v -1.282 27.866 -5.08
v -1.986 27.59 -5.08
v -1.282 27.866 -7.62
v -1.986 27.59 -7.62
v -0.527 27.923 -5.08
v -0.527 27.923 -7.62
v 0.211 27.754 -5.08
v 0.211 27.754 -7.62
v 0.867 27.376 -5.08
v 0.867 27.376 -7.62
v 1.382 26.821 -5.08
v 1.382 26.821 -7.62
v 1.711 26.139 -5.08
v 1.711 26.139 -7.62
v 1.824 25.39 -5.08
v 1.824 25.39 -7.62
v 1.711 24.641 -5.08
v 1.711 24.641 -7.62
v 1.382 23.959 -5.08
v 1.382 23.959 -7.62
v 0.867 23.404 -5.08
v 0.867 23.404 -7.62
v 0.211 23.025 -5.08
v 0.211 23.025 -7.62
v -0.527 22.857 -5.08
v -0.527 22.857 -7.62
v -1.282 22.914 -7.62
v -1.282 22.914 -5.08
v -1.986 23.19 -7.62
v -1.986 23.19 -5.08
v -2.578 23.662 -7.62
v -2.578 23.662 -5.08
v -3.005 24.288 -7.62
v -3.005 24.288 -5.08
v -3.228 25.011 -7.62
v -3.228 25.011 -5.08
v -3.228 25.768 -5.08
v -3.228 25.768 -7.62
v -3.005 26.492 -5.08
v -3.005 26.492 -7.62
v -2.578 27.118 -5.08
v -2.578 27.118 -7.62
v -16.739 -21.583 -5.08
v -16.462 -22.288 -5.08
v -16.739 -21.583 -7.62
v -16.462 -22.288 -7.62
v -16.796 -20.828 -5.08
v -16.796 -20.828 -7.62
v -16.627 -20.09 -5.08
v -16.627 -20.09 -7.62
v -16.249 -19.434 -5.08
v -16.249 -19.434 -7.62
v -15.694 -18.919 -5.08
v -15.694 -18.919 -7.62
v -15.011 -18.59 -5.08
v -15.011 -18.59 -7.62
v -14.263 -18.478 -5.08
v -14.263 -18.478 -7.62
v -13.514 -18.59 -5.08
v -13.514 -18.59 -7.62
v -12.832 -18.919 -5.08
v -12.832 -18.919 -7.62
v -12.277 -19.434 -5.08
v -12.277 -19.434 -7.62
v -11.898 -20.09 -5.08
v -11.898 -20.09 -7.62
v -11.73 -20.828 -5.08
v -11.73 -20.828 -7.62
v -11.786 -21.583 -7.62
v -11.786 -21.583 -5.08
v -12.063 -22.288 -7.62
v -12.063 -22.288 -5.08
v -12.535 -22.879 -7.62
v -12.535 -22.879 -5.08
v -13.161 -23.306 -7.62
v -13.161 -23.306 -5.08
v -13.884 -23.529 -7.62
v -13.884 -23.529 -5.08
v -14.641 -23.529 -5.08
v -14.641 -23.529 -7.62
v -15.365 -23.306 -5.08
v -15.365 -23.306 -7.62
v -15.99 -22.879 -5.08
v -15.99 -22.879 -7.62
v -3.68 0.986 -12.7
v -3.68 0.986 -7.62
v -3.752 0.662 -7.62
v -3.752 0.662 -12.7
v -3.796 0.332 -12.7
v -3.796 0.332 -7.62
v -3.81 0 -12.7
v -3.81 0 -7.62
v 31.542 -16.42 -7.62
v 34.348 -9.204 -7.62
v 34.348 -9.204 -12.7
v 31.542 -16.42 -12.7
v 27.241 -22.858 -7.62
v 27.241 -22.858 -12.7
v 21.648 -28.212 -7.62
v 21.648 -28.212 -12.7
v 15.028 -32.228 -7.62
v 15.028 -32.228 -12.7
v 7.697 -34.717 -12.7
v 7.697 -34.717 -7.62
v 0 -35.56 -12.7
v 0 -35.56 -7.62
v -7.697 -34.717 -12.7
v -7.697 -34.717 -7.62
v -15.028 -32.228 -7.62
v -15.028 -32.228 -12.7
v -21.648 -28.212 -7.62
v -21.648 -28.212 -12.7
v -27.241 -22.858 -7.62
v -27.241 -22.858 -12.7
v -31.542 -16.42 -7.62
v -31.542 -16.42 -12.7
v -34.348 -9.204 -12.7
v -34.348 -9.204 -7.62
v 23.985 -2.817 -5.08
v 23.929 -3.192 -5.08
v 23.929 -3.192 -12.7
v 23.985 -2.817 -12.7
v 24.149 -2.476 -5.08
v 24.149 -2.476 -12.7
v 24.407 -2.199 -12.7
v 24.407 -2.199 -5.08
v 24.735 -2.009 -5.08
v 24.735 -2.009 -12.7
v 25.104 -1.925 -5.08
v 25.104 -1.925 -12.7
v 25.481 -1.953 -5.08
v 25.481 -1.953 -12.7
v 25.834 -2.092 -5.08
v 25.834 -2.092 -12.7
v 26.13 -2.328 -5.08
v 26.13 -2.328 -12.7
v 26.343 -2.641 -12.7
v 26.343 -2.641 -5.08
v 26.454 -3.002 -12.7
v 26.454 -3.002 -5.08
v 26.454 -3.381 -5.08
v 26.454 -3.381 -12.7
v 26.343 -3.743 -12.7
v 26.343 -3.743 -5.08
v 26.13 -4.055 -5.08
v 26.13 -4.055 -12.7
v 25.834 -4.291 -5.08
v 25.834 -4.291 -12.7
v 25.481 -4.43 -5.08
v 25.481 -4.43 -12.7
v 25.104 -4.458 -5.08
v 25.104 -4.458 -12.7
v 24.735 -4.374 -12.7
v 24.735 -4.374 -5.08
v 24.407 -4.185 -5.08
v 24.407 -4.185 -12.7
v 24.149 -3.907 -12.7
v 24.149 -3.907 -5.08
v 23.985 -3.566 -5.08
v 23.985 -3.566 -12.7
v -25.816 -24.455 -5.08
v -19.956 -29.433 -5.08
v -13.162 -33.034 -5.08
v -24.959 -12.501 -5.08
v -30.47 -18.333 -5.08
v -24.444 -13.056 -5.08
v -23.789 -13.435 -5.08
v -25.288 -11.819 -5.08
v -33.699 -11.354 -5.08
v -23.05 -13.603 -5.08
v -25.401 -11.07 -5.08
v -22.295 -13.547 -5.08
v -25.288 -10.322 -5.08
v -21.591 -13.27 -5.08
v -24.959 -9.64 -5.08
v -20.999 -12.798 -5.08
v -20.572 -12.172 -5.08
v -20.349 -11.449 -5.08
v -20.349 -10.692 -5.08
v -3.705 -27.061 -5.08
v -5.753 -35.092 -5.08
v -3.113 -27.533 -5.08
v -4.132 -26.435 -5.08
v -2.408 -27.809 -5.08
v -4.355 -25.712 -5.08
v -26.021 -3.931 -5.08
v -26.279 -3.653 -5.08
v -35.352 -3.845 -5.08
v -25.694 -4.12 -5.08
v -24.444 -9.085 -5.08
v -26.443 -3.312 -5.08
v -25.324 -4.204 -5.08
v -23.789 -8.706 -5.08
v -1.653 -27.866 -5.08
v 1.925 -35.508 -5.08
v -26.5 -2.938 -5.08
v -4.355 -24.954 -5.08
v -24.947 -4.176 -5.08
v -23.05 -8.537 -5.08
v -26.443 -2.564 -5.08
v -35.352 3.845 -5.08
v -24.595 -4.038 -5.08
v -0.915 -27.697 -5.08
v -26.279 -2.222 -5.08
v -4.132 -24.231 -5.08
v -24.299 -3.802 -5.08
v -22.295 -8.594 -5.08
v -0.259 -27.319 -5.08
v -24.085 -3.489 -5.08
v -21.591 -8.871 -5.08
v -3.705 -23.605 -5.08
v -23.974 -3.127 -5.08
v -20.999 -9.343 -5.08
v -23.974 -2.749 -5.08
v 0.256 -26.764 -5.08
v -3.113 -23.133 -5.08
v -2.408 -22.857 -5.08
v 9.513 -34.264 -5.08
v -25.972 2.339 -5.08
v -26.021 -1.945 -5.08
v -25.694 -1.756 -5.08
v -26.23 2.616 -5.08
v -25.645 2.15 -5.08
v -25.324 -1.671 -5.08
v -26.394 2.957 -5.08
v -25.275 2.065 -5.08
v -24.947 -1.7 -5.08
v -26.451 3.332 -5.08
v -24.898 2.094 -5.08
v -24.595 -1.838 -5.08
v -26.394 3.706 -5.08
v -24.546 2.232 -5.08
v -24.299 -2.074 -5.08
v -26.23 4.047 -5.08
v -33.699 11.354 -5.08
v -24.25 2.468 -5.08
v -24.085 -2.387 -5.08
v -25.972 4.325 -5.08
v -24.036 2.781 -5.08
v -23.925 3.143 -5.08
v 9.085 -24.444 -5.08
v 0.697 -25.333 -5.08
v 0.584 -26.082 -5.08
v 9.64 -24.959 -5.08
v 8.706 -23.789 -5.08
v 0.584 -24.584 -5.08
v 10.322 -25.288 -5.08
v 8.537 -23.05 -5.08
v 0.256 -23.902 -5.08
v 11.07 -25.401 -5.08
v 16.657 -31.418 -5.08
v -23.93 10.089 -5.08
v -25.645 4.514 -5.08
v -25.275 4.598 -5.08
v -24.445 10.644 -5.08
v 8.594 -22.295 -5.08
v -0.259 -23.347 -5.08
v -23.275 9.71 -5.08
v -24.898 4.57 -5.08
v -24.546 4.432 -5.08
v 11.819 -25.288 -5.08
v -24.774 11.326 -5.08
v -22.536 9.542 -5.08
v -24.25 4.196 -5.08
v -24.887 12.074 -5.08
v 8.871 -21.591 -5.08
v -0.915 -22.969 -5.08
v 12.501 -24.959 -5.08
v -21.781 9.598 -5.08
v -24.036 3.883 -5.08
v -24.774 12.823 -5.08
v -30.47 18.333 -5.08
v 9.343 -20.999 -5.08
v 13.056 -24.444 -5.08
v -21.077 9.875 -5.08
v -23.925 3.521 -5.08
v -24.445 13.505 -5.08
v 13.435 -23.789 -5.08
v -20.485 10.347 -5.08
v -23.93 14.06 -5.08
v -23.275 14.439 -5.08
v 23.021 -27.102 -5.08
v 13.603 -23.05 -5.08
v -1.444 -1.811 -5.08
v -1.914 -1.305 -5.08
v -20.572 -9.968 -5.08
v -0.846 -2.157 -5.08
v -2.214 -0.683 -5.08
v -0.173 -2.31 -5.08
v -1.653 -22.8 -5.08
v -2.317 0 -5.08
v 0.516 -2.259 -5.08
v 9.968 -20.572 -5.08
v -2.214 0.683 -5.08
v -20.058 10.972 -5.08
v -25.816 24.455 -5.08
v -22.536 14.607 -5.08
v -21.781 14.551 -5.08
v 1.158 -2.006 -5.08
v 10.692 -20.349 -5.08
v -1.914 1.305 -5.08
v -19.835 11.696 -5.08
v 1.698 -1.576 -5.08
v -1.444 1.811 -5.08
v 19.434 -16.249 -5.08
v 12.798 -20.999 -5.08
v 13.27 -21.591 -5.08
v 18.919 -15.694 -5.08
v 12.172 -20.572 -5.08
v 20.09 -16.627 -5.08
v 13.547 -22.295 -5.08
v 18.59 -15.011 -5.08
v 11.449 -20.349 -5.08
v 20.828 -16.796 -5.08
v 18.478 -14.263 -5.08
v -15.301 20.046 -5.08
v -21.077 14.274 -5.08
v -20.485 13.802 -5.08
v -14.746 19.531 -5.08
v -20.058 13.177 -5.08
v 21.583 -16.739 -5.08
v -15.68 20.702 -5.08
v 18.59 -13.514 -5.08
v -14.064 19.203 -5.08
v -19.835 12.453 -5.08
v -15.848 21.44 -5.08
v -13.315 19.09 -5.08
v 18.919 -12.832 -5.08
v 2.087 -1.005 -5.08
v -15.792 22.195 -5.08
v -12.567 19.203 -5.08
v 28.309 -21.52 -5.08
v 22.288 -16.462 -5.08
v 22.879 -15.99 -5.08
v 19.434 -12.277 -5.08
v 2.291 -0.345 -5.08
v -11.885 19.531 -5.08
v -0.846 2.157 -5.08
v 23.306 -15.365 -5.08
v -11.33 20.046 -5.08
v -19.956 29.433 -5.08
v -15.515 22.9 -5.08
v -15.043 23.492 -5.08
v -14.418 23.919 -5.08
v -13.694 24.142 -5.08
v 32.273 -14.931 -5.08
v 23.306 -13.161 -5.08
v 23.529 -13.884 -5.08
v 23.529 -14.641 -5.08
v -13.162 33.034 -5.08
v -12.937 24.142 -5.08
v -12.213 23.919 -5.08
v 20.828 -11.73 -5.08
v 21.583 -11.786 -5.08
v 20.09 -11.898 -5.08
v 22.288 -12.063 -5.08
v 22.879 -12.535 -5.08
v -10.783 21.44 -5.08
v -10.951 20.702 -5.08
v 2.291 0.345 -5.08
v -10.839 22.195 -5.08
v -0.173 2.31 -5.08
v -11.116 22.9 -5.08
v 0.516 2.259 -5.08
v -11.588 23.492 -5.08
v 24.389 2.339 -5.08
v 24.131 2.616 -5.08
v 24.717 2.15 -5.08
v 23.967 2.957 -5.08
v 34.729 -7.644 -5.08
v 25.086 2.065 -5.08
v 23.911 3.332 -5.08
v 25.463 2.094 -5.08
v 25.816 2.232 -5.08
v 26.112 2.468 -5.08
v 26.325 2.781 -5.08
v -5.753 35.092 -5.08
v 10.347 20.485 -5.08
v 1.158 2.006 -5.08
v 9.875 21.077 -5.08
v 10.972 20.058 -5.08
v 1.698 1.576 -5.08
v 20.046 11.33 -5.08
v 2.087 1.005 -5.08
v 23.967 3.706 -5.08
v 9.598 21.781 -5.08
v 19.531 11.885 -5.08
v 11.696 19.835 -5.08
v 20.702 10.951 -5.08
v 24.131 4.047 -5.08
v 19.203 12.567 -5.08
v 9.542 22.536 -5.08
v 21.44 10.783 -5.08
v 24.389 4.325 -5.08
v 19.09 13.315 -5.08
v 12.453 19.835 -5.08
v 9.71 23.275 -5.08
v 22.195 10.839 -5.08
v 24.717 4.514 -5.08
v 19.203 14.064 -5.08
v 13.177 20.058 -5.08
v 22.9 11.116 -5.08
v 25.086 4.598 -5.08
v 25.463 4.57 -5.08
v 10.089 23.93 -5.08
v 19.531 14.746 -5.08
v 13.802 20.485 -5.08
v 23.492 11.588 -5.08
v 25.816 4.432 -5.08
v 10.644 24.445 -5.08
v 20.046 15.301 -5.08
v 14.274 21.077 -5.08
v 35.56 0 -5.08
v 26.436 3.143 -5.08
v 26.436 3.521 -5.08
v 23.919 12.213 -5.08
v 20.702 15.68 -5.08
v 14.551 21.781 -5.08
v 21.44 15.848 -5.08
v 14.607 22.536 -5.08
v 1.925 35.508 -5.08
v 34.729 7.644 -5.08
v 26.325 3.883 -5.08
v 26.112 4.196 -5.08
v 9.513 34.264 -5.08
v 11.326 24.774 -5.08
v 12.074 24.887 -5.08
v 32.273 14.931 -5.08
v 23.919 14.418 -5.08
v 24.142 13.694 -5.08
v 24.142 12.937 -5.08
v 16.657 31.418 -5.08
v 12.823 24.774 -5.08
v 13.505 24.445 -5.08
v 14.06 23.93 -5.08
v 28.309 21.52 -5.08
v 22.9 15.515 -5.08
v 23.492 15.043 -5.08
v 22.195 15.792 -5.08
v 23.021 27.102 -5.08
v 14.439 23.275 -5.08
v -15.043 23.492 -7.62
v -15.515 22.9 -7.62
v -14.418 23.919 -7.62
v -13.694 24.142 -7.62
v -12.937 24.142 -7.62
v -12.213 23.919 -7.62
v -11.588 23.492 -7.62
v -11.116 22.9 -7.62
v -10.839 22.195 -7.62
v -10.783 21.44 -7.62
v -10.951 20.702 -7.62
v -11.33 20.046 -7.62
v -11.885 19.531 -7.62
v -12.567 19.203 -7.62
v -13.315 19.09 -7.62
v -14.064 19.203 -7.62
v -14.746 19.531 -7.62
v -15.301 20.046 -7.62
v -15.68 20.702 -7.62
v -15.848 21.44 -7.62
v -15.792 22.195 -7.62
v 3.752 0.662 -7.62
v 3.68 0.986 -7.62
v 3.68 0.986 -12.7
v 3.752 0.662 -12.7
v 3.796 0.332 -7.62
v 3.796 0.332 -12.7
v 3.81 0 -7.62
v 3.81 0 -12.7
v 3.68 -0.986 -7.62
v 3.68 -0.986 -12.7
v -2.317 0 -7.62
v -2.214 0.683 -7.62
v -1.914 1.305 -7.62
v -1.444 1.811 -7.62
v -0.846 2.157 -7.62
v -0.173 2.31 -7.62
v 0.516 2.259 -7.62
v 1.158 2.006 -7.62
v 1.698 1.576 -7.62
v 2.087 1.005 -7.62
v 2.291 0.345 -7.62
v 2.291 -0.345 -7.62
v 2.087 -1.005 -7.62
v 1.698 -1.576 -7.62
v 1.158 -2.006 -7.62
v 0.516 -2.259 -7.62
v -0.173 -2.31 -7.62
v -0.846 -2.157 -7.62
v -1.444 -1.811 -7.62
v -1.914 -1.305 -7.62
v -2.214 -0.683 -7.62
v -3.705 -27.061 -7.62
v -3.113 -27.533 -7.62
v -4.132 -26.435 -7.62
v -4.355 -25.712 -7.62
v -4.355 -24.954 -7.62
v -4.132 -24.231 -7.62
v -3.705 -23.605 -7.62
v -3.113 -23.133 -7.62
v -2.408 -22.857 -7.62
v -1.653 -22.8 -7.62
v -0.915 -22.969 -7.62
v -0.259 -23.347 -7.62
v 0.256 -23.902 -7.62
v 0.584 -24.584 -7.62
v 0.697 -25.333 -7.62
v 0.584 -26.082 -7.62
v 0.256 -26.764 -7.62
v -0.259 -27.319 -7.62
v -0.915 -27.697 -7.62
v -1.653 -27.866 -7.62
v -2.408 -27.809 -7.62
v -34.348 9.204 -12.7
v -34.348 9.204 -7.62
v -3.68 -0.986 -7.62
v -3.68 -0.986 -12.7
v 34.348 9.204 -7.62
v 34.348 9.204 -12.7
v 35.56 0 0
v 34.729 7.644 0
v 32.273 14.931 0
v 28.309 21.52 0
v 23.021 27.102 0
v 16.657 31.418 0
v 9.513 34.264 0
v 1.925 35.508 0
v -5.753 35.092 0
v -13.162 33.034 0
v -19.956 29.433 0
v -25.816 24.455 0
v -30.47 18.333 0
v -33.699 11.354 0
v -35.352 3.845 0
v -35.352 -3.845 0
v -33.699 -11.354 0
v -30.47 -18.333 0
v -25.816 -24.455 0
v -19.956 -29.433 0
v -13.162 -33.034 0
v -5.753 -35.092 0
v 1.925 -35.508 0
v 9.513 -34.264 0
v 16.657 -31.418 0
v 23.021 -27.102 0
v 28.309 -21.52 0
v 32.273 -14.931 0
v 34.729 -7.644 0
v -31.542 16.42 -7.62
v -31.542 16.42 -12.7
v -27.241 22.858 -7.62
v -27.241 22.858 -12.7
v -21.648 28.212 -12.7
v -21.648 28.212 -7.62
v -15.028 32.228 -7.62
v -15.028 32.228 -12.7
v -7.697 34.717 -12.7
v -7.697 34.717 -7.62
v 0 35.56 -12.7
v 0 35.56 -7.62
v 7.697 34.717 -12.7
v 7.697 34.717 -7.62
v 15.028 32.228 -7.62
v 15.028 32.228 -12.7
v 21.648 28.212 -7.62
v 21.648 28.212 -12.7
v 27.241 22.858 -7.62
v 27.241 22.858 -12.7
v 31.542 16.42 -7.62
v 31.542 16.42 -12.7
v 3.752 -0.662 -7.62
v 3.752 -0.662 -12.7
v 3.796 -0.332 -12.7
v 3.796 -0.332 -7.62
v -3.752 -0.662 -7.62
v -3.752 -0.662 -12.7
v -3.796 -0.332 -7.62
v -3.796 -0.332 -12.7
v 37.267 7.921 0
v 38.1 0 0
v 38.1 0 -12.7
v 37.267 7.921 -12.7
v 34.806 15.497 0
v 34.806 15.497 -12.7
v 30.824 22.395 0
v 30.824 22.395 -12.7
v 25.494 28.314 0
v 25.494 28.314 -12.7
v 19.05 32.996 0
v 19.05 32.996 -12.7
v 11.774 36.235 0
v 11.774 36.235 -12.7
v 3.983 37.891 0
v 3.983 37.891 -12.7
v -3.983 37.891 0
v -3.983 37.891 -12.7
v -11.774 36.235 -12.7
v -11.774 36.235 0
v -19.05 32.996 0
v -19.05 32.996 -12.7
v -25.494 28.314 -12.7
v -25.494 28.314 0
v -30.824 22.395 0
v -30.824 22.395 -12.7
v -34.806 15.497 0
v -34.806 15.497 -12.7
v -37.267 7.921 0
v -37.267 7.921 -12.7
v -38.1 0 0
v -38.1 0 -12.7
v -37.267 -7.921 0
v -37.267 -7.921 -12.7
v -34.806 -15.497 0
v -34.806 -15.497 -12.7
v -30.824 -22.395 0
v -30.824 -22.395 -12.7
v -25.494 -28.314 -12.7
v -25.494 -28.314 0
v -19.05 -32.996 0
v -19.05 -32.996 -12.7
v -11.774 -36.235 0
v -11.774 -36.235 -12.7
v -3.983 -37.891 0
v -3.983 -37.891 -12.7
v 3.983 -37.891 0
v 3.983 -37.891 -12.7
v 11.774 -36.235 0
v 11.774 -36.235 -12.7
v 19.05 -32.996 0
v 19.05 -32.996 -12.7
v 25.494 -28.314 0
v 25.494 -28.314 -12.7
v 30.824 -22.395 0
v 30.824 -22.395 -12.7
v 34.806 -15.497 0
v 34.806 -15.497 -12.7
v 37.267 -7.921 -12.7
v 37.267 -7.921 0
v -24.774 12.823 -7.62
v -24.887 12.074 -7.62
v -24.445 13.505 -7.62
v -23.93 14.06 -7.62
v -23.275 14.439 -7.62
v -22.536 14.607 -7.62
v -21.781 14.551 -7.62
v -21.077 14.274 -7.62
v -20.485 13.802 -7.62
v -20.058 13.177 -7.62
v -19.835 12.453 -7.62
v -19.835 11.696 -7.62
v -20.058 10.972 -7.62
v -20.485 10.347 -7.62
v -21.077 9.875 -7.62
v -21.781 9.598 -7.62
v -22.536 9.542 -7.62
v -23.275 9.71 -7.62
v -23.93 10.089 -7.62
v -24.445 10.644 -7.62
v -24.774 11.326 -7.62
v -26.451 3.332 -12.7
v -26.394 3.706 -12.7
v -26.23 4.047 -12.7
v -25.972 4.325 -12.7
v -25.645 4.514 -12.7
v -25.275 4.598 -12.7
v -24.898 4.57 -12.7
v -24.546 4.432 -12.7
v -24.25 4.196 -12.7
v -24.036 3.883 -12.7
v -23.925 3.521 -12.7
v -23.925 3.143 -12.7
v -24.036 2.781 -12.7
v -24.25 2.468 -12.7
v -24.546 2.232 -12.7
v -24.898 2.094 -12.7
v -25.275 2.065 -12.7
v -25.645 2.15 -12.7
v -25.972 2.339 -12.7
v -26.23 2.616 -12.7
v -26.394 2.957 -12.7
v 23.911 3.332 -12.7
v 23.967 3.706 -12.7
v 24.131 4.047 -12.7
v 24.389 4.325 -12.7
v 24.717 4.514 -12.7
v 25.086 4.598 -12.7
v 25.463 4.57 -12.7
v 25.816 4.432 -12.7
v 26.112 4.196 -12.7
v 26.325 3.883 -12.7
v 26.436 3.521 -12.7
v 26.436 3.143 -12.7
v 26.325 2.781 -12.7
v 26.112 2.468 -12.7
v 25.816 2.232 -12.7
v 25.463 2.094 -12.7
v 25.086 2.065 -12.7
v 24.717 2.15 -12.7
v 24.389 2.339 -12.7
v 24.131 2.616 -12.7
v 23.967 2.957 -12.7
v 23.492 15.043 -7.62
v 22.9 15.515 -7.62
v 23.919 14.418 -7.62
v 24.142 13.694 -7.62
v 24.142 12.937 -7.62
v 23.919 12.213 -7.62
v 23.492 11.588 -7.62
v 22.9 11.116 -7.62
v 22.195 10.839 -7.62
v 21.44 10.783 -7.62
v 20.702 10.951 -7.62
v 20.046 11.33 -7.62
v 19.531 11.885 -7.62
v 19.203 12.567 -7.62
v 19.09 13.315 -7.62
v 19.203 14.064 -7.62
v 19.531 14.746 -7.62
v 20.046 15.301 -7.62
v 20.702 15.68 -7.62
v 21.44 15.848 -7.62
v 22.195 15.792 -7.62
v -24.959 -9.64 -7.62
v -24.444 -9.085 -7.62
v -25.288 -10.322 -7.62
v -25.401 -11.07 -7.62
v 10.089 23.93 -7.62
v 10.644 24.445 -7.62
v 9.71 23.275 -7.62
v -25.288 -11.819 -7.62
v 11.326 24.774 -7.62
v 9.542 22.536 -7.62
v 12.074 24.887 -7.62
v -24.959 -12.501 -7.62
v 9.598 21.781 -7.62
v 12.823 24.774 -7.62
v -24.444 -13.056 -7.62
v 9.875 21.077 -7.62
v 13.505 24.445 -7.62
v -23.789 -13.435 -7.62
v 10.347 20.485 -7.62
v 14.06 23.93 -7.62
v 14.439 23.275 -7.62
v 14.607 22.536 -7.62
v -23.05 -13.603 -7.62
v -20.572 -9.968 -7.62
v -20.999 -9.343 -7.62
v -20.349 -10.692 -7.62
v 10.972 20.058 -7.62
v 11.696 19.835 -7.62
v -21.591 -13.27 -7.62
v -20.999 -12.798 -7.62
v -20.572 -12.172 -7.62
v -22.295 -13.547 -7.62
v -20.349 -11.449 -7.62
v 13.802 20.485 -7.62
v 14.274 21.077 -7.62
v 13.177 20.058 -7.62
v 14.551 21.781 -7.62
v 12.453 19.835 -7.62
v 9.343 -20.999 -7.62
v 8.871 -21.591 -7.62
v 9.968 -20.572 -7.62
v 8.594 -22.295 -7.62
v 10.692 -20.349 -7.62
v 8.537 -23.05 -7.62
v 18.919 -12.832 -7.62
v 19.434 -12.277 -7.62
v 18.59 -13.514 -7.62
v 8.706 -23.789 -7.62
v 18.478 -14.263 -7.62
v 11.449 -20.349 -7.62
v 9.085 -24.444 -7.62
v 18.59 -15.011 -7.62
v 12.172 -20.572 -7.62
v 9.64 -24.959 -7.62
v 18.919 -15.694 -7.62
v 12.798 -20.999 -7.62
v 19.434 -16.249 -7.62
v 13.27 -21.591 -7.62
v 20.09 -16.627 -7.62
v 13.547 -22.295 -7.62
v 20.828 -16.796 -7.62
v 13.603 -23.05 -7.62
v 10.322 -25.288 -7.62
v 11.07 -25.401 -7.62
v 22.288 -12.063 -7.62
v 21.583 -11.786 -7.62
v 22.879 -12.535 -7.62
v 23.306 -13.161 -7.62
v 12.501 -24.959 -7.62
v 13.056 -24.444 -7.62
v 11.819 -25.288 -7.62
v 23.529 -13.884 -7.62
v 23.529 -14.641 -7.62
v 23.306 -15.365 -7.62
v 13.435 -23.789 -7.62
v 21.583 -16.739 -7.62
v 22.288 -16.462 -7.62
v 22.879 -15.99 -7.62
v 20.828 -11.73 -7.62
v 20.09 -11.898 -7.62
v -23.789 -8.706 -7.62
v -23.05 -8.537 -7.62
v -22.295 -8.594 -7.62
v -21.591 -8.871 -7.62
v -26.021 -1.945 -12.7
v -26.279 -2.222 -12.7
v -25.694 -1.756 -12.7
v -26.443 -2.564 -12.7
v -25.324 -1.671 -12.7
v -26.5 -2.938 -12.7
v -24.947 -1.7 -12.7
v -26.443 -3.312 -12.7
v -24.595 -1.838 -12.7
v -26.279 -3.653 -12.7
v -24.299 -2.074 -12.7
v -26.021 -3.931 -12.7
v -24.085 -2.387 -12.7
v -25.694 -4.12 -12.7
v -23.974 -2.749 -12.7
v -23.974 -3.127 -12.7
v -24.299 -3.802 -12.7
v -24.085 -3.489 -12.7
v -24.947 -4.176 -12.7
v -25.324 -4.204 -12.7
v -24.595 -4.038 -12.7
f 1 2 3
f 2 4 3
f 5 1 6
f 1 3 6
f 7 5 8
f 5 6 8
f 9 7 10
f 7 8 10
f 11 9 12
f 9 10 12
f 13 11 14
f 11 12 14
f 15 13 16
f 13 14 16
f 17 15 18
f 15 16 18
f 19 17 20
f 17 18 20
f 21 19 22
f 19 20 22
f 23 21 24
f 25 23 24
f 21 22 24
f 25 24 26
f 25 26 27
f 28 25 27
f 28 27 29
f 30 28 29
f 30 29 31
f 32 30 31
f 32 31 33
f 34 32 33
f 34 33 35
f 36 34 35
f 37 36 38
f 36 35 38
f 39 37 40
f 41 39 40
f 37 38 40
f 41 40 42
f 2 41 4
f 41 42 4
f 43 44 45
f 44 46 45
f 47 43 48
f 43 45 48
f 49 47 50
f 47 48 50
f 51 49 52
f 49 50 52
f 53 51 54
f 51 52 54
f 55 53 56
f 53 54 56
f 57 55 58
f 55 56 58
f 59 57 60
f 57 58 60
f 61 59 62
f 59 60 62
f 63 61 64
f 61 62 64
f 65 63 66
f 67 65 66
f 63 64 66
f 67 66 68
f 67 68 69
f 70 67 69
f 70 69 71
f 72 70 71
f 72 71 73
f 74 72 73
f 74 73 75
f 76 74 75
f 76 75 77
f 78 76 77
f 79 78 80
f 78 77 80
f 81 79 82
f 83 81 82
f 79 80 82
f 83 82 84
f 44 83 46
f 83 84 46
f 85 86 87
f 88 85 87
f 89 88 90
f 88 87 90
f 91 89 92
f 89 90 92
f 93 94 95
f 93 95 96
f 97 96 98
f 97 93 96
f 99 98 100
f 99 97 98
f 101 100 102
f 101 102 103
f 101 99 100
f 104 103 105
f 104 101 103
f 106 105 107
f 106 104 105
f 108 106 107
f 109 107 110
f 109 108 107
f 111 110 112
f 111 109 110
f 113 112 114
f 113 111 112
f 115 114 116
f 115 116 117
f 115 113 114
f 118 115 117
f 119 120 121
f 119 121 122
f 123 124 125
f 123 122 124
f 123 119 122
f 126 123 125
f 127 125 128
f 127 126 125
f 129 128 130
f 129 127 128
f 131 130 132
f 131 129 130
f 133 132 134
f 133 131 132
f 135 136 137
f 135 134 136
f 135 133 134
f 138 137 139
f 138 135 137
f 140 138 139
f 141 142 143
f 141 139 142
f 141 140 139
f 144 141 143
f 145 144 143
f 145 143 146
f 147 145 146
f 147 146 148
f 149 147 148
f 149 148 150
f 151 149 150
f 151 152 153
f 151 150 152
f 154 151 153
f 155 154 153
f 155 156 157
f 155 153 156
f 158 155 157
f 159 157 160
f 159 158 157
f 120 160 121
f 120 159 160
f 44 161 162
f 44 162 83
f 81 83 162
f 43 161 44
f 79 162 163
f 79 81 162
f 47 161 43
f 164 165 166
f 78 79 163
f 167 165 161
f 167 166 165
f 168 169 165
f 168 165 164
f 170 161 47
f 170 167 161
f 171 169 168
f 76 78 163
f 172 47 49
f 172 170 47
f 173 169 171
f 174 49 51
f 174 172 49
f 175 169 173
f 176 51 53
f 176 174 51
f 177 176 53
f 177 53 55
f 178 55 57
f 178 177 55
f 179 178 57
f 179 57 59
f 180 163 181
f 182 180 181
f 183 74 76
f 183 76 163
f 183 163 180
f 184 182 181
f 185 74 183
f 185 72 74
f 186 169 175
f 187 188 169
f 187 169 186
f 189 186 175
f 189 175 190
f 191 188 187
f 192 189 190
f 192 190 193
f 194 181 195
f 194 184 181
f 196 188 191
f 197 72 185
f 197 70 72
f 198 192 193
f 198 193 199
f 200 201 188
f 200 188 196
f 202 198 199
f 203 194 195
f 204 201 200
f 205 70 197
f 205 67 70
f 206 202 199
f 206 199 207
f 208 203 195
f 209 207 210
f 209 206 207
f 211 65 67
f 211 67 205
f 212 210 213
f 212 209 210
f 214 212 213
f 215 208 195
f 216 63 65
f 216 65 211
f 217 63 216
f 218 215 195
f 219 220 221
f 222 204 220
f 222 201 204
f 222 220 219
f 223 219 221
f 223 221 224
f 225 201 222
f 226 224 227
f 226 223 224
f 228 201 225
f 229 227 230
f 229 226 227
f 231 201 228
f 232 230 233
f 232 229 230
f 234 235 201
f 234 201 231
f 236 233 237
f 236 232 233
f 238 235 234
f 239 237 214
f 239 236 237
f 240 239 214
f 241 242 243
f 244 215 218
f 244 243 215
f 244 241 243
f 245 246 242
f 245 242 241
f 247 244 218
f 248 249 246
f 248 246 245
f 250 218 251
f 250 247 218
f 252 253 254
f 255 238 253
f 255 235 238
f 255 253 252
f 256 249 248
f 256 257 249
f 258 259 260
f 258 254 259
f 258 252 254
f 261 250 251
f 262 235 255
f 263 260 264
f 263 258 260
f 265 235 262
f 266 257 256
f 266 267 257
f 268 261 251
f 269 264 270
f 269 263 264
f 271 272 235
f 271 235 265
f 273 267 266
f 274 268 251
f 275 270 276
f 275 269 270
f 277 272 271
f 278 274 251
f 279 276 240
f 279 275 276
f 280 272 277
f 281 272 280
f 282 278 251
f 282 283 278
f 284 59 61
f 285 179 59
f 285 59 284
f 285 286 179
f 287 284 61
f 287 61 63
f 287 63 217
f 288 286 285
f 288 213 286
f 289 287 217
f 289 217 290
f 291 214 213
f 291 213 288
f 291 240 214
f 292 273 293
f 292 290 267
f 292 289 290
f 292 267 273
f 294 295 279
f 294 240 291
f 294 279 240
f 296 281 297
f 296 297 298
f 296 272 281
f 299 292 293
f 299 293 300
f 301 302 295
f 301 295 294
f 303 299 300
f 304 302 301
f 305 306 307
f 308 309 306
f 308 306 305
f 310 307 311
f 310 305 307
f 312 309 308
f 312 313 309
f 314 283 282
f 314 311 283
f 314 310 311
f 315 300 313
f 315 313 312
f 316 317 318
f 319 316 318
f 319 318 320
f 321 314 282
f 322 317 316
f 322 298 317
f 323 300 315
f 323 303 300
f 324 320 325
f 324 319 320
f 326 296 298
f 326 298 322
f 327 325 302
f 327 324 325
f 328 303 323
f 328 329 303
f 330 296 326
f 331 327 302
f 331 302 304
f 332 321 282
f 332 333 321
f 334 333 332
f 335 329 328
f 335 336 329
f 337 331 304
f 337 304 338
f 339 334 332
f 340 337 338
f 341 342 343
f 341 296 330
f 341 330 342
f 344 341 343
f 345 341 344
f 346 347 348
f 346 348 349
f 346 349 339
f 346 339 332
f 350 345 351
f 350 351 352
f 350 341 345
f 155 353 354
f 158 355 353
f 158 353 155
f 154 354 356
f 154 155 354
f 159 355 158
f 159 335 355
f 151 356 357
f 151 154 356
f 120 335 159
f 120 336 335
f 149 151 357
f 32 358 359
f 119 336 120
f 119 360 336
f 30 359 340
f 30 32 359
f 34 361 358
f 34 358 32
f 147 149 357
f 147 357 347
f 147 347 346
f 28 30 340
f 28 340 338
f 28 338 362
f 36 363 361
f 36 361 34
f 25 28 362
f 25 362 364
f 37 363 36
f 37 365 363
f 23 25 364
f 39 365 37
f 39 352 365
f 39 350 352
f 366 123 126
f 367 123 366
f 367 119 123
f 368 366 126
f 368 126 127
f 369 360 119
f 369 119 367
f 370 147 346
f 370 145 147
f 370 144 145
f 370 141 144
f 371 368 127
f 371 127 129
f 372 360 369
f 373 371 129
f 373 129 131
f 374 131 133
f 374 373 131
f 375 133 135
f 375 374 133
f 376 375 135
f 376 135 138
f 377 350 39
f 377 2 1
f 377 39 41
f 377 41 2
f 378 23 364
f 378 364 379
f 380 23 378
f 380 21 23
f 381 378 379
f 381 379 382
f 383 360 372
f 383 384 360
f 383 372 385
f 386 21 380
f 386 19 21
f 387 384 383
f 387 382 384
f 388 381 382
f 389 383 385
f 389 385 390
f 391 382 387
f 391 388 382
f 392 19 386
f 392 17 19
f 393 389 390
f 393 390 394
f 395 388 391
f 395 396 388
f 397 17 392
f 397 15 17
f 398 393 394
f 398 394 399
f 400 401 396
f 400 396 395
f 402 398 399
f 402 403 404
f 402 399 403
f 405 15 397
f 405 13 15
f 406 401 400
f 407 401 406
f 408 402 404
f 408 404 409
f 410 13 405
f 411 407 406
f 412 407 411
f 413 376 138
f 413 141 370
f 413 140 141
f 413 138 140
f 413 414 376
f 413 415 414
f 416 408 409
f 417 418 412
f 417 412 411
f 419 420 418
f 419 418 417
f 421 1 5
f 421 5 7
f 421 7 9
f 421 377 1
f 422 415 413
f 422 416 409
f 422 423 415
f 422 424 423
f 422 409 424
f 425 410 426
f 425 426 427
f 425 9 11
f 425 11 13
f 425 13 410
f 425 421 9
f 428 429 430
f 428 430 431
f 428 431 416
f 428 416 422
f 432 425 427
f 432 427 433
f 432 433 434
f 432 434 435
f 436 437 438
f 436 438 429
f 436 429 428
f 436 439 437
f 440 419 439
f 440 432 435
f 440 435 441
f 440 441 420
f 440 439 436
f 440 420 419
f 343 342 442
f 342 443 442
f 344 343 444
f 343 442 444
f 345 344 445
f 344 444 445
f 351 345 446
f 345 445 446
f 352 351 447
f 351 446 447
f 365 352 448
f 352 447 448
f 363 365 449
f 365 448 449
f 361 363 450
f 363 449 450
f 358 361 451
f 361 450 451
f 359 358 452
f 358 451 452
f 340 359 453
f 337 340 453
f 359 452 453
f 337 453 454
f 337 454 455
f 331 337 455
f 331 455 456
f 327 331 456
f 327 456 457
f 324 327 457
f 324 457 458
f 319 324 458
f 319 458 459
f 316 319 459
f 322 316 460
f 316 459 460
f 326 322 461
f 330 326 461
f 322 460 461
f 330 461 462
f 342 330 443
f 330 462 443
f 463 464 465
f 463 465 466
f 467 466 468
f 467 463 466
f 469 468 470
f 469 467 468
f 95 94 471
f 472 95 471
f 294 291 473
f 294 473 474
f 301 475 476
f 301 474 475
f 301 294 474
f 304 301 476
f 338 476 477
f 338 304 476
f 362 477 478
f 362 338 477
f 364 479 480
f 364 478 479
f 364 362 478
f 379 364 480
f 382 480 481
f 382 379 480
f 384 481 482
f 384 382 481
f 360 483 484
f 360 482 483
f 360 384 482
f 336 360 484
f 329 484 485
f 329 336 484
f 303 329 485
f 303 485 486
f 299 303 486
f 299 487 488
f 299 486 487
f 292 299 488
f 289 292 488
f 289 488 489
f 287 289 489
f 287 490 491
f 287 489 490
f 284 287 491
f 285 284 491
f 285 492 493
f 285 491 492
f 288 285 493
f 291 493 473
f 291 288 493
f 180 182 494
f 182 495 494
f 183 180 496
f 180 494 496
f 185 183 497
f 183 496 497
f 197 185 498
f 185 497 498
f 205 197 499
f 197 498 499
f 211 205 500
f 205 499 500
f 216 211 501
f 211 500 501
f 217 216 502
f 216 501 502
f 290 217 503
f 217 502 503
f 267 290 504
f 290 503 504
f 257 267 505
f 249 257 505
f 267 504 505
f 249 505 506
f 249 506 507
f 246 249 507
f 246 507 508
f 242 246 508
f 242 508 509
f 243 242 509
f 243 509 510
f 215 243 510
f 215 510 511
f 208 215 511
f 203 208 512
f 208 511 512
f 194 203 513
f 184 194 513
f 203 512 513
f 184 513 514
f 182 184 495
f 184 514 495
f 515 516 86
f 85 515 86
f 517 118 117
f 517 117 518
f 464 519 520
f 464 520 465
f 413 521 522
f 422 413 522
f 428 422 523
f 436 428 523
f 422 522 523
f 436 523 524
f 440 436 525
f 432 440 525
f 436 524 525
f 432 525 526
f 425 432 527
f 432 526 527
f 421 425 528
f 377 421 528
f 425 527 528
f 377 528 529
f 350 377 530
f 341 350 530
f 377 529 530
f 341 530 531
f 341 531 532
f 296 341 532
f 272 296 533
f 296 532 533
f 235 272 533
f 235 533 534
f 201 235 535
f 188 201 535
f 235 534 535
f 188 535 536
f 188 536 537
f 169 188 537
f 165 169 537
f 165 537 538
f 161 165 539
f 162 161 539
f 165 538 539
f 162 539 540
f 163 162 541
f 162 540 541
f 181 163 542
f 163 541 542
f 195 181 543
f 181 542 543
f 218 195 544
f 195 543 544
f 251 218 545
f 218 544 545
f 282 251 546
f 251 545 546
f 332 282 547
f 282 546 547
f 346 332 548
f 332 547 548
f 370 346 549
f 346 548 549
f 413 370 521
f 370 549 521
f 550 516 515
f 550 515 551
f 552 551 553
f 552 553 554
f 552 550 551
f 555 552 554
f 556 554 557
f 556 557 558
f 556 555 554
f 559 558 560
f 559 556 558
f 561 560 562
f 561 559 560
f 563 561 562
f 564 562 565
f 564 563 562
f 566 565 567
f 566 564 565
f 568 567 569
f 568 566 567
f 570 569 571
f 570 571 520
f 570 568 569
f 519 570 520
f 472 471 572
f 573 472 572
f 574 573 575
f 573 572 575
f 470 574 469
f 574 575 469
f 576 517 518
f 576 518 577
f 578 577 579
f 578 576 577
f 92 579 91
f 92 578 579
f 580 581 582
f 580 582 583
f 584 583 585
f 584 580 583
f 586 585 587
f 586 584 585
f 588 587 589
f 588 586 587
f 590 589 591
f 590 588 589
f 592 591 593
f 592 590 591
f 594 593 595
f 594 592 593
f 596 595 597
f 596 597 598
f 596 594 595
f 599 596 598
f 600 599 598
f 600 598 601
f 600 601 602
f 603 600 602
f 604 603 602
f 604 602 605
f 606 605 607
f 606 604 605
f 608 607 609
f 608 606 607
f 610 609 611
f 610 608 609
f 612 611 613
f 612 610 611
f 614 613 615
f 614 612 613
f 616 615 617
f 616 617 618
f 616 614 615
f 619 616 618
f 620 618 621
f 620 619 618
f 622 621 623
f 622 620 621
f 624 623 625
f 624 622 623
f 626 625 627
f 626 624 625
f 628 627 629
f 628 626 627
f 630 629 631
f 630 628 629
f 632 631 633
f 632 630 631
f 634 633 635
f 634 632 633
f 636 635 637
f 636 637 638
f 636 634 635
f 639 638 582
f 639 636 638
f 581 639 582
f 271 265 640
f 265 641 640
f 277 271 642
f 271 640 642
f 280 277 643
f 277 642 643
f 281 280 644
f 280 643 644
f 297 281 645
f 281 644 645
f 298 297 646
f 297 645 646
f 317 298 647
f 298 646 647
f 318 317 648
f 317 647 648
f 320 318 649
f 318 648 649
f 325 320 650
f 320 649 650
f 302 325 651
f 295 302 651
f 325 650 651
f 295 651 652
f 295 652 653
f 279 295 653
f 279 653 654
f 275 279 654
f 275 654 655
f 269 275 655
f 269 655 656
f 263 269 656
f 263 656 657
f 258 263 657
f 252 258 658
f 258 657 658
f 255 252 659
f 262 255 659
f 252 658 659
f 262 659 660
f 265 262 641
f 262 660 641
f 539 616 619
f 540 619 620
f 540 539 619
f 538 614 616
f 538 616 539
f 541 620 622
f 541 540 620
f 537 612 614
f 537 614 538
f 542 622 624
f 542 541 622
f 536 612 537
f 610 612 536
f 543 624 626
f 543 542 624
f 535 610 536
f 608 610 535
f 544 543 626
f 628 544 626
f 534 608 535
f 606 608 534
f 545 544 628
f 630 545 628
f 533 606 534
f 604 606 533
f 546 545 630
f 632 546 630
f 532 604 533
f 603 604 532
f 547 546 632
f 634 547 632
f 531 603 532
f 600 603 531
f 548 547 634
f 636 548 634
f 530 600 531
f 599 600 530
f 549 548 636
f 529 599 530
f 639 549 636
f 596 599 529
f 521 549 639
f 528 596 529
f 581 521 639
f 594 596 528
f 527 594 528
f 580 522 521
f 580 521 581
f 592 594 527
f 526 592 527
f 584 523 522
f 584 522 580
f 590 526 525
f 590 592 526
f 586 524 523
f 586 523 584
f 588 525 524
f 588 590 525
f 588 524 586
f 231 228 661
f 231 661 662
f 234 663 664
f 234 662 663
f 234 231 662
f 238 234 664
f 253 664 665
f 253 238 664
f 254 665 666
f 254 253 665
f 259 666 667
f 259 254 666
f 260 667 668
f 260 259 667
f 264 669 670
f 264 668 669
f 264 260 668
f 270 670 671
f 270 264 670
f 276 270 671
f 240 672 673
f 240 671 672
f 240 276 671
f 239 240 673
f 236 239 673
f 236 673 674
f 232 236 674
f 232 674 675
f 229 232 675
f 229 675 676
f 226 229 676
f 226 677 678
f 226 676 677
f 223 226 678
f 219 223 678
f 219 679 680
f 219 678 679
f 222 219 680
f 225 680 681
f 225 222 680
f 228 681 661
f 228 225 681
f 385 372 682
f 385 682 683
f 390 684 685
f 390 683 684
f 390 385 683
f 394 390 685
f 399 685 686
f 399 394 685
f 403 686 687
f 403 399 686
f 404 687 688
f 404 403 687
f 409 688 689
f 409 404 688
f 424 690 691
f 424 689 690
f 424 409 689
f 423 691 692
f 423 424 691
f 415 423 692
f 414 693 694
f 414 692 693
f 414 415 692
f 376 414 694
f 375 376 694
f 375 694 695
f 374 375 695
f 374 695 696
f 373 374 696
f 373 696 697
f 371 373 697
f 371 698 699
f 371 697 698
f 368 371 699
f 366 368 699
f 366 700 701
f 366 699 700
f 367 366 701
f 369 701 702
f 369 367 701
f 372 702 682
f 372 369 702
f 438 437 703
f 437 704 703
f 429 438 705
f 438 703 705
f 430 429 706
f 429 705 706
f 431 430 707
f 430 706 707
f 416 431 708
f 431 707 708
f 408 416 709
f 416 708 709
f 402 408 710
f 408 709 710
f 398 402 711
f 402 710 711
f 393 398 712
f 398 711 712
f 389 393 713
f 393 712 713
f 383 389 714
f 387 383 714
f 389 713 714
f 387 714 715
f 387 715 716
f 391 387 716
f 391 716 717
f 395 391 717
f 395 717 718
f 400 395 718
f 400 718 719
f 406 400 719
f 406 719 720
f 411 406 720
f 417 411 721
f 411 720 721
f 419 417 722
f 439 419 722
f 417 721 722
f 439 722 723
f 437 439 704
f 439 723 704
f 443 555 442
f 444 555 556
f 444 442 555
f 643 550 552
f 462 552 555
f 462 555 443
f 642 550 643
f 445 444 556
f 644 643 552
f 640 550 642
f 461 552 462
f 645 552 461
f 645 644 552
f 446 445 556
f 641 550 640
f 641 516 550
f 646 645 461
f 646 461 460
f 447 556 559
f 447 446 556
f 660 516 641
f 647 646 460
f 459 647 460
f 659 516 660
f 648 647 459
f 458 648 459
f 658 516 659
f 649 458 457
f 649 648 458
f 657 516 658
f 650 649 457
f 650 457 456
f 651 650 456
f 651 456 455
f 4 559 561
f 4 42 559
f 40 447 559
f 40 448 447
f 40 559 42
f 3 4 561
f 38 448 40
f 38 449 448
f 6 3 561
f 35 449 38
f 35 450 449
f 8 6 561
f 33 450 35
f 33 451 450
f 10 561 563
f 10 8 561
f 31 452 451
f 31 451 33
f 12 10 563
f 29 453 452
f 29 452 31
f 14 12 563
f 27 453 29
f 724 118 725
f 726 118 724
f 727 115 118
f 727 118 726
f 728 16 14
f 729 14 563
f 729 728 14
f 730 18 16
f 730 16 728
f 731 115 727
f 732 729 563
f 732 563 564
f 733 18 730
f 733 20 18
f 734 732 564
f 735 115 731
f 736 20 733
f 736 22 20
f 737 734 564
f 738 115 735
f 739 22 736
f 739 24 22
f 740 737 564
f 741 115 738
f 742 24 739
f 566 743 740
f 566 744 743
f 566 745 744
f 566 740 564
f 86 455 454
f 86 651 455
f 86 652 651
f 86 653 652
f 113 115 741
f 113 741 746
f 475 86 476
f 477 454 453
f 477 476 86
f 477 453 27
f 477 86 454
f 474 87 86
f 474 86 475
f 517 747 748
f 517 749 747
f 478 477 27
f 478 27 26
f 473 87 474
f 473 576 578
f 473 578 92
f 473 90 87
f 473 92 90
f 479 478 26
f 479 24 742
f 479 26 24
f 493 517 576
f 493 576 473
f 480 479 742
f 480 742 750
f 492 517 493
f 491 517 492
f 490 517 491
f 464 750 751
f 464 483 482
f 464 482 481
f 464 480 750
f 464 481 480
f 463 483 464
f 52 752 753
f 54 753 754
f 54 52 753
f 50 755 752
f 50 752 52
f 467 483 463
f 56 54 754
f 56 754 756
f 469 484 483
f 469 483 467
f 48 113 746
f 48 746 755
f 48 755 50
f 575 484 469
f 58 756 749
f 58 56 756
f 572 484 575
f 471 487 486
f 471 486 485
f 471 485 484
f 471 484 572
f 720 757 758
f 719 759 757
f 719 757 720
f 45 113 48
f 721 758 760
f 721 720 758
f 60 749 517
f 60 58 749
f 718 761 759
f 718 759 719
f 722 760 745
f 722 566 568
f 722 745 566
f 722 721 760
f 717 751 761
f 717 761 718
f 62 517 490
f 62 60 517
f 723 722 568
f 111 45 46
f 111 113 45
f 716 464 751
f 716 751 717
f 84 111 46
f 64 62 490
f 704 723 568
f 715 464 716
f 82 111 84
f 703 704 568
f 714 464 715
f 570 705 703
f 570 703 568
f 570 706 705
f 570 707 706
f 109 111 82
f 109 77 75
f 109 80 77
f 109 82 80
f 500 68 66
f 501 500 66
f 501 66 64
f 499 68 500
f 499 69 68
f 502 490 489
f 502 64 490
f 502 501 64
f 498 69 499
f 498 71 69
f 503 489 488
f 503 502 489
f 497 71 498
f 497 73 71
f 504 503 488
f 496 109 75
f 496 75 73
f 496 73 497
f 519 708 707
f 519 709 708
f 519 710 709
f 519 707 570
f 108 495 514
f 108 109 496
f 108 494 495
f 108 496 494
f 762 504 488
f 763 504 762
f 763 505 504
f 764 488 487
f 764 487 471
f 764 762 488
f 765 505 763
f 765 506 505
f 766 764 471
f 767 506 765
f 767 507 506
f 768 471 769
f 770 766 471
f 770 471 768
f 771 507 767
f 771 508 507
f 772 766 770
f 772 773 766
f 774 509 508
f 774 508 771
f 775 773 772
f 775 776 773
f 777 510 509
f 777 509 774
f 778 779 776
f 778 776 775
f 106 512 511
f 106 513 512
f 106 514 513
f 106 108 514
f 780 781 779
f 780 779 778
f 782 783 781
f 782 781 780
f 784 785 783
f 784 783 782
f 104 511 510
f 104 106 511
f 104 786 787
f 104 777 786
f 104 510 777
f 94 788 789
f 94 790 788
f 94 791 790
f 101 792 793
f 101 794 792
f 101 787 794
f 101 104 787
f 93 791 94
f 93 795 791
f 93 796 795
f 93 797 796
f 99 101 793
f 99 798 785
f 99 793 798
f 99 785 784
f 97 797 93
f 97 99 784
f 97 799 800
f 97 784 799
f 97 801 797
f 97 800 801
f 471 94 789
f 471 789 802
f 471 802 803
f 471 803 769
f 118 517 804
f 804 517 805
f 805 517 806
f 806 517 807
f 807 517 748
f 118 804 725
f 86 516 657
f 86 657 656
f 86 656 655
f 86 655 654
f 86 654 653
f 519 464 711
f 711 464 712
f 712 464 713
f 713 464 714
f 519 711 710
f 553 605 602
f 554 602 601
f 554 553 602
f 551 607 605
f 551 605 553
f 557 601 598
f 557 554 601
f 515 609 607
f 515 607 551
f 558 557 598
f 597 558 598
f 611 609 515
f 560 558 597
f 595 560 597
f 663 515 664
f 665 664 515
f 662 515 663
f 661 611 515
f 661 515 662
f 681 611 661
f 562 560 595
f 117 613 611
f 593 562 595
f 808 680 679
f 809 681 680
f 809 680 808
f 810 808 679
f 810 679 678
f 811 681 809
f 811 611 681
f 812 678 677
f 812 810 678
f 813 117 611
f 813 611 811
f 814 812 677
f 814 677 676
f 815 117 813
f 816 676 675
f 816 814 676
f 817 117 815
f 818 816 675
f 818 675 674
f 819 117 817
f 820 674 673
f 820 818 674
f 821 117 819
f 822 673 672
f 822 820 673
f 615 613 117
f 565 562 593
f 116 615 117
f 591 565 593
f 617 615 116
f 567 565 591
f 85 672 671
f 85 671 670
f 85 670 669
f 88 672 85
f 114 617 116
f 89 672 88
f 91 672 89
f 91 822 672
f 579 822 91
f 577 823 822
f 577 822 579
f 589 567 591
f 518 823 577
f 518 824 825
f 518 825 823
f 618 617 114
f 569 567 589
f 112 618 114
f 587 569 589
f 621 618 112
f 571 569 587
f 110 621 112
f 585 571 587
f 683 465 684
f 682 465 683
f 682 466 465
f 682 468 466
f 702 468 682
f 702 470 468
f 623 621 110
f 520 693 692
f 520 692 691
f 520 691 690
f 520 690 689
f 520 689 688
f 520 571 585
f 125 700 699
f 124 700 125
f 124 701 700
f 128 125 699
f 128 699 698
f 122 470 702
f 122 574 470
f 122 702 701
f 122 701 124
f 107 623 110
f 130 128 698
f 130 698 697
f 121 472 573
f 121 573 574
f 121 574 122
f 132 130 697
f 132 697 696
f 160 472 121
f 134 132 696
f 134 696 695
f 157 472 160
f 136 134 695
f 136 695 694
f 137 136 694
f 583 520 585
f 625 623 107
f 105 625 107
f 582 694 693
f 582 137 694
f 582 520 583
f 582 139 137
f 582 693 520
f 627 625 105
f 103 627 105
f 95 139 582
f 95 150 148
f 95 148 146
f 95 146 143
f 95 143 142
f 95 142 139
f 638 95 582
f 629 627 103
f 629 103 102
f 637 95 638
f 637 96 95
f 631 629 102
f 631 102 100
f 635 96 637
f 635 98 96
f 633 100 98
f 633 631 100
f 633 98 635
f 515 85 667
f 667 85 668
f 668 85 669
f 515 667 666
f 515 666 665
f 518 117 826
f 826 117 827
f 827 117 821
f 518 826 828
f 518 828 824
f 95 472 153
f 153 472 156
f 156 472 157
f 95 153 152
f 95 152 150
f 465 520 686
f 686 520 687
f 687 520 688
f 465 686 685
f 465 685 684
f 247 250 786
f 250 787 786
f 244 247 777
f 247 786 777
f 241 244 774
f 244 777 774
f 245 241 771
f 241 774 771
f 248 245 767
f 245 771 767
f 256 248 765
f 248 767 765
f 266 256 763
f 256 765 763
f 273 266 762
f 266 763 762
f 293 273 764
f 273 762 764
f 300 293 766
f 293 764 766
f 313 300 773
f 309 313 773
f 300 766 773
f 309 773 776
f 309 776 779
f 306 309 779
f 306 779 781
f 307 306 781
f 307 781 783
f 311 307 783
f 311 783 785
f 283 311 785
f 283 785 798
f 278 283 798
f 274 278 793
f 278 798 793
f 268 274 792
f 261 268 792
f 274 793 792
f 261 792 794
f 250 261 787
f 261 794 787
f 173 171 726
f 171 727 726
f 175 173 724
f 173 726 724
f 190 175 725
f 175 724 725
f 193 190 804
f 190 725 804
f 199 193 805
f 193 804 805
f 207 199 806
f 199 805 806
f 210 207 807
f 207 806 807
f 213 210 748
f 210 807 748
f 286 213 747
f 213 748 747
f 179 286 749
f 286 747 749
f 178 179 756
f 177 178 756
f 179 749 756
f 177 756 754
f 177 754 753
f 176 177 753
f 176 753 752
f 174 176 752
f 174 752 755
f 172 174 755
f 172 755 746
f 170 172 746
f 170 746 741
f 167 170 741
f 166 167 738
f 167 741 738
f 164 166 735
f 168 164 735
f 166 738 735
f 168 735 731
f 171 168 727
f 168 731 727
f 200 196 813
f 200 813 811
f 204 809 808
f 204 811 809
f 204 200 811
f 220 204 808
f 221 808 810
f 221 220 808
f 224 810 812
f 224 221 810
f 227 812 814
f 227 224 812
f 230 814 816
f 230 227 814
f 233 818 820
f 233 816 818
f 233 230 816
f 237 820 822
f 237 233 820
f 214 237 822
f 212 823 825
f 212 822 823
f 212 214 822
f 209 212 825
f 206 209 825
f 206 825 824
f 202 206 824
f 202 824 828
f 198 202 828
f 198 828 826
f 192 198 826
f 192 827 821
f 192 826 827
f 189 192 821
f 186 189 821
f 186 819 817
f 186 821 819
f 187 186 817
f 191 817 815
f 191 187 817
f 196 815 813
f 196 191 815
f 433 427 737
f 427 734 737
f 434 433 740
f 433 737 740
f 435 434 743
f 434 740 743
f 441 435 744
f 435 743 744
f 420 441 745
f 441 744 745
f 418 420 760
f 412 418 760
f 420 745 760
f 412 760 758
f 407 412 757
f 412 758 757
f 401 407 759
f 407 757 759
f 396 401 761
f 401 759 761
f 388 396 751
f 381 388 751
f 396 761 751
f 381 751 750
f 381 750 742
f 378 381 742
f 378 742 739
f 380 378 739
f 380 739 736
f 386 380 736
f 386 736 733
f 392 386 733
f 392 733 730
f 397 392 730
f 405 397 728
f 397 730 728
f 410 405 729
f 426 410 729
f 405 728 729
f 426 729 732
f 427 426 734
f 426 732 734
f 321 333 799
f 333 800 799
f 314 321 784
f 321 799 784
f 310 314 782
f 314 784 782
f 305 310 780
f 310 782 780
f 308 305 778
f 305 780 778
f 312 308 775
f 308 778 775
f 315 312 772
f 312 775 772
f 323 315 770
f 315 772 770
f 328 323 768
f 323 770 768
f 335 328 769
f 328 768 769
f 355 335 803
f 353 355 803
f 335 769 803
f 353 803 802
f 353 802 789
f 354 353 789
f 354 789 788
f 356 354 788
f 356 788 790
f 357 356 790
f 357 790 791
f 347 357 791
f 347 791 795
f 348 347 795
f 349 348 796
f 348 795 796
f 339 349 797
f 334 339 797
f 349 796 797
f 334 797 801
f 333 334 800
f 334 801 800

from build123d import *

# Parameters (mm, degrees)
SKETCH1_R               = 38.1
BOSS_EXTRUDE2_DEPTH     = 12.7
SKETCH3_R               = 35.56
CUT_EXTRUDE2_DEPTH      = 5.08
CUT_EXTRUDE3_START      = -5.08
SKETCH4_R               = 35.56
CUT_EXTRUDE3_DEPTH      = 5.08
BOSS_EXTRUDE3_DEPTH     = 5.08
BOSS_EXTRUDE4_DEPTH     = 5.08
SKETCH9_R               = 2.54
CUT_EXTRUDE5_DEPTH      = 55.417684625
CIRPATTERN1_COUNT       = 5
CIRPATTERN1_ANGLE       = 120
SKETCH10_R              = 2.54
CUT_EXTRUDE6_DEPTH      = 55.417684625
CIRPATTERN2_COUNT       = 5
CIRPATTERN2_ANGLE       = 120
CUT_EXTRUDE7_DEPTH      = 55.417684625
CUT_EXTRUDE7_DEPTH_BACK = 55.417684625
SKETCH11_R              = 1.27
CUT_EXTRUDE8_DEPTH      = 55.417684625
CUT_EXTRUDE8_DEPTH_BACK = 55.417684625
SKETCH12_R              = 2.31672553


with BuildPart() as part:
    # Sketch1 → Boss-Extrude2 (new body)
    with BuildSketch(Plane.XY):
        Circle(SKETCH1_R)
    extrude(amount=-BOSS_EXTRUDE2_DEPTH)

    # Sketch3 → Cut-Extrude2 (cut)
    with BuildSketch(Plane.XY):
        Circle(SKETCH3_R)
    extrude(amount=-CUT_EXTRUDE2_DEPTH, mode=Mode.SUBTRACT)

    # Sketch4 → Cut-Extrude3 (cut)
    with BuildSketch(Plane(origin=(0, 0, -12.7), x_dir=(-1, 0, 0), z_dir=(0, 0, -1)).offset(CUT_EXTRUDE3_START)):
        with Locations(Location((0, 0, 0), (0, 0, 180))):
            Circle(SKETCH4_R)
    extrude(amount=CUT_EXTRUDE3_DEPTH, mode=Mode.SUBTRACT)

    # Sketch6 → Boss-Extrude3 (add)
    with BuildSketch(Plane(origin=(0, 0, -7.62), x_dir=(-1, 0, 0), z_dir=(0, 0, -1))):
        with BuildLine():
            Line((-3.81, 0), (-35.56, 0))
            ThreePointArc((-35.56, 0), (-35.25577927, -4.641511395), (-34.348322383, -9.203605244))
            Line((-34.348322383, -9.203605244), (-3.680177398, -0.986100562))
            ThreePointArc((-3.680177398, -0.986100562), (-3.777404922, -0.497304792), (-3.81, 0))
        make_face()
    boss_extrude3 = extrude(amount=BOSS_EXTRUDE3_DEPTH)

    # Mirror2: Boss-Extrude3 across plane
    add(boss_extrude3.mirror(Plane(origin=(3.81, 0, -45.881763645), x_dir=(0, 0, 1), z_dir=(0, -1, 0))))

    # Sketch8 → Boss-Extrude4 (add)
    with BuildSketch(Plane(origin=(0, 0, -7.62), x_dir=(-1, 0, 0), z_dir=(0, 0, -1))):
        with BuildLine():
            Line((3.81, 0), (35.56, 0))
            ThreePointArc((35.56, 0), (35.25577927, -4.641511395), (34.348322383, -9.203605244))
            Line((34.348322383, -9.203605244), (3.680177398, -0.986100562))
            ThreePointArc((3.680177398, -0.986100562), (3.777404922, -0.497304792), (3.81, 0))
        make_face()
    boss_extrude4 = extrude(amount=BOSS_EXTRUDE4_DEPTH)

    # Mirror3: Boss-Extrude4 across plane
    add(boss_extrude4.mirror(Plane(origin=(-3.81, 0, -45.881763645), x_dir=(0, 0, 1), z_dir=(0, -1, 0))))

    # Sketch9 → Cut-Extrude5 (cut, symmetric)
    with BuildSketch(Plane(origin=(0, 0, -7.62), x_dir=(-1, 0, 0), z_dir=(0, 0, -1))):
        with Locations((22.346538839, 12.074444166)):
            Circle(SKETCH9_R)
    cut_extrude5 = extrude(amount=CUT_EXTRUDE5_DEPTH, both=True, mode=Mode.SUBTRACT)

    # CirPattern1: Cut-Extrude5 ×5 about axis
    cirpattern1_axis = Axis((0, 0, 0), (0, 0, -1))
    for i in range(1, CIRPATTERN1_COUNT):
        add(cut_extrude5.rotate(cirpattern1_axis, i * CIRPATTERN1_ANGLE / (CIRPATTERN1_COUNT - 1)), mode=Mode.SUBTRACT)

    # Sketch10 → Cut-Extrude6 (cut, symmetric)
    with BuildSketch(Plane(origin=(0, 0, -7.62), x_dir=(-1, 0, 0), z_dir=(0, 0, -1))):
        with Locations((22.86059693, -11.070370726)):
            Circle(SKETCH10_R)
    cut_extrude6 = extrude(amount=CUT_EXTRUDE6_DEPTH, both=True, mode=Mode.SUBTRACT)

    # CirPattern2: Cut-Extrude6 ×5 about axis
    cirpattern2_axis = Axis((0, 0, 0), (0, 0, 1))
    for i in range(1, CIRPATTERN2_COUNT):
        add(cut_extrude6.rotate(cirpattern2_axis, i * CIRPATTERN2_ANGLE / (CIRPATTERN2_COUNT - 1)), mode=Mode.SUBTRACT)

    # Sketch11 → Cut-Extrude7 (cut, two sides: drawn at the far end of the back side and taken through both)
    with BuildSketch(Plane(origin=(0, 0, -7.62), x_dir=(-1, 0, 0), z_dir=(0, 0, -1)).offset(-CUT_EXTRUDE7_DEPTH_BACK)):
        with Locations((-25.180527268, 3.331823302)):
            Circle(SKETCH11_R)
        with Locations((-25.198683581, -3.191605521)):
            Circle(SKETCH11_R)
        with Locations((25.180527268, 3.331823302)):
            Circle(SKETCH11_R)
        with Locations((25.229521307, -2.937899696)):
            Circle(SKETCH11_R)
    extrude(amount=CUT_EXTRUDE7_DEPTH + CUT_EXTRUDE7_DEPTH_BACK, mode=Mode.SUBTRACT)

    # Sketch12 → Cut-Extrude8 (cut, two sides: drawn at the far end of the back side and taken through both)
    with BuildSketch(Plane(origin=(0, 0, -7.62), x_dir=(-1, 0, 0), z_dir=(0, 0, -1)).offset(-CUT_EXTRUDE8_DEPTH_BACK)):
        Circle(SKETCH12_R)
    extrude(amount=CUT_EXTRUDE8_DEPTH + CUT_EXTRUDE8_DEPTH_BACK, mode=Mode.SUBTRACT)


solid = part.part
